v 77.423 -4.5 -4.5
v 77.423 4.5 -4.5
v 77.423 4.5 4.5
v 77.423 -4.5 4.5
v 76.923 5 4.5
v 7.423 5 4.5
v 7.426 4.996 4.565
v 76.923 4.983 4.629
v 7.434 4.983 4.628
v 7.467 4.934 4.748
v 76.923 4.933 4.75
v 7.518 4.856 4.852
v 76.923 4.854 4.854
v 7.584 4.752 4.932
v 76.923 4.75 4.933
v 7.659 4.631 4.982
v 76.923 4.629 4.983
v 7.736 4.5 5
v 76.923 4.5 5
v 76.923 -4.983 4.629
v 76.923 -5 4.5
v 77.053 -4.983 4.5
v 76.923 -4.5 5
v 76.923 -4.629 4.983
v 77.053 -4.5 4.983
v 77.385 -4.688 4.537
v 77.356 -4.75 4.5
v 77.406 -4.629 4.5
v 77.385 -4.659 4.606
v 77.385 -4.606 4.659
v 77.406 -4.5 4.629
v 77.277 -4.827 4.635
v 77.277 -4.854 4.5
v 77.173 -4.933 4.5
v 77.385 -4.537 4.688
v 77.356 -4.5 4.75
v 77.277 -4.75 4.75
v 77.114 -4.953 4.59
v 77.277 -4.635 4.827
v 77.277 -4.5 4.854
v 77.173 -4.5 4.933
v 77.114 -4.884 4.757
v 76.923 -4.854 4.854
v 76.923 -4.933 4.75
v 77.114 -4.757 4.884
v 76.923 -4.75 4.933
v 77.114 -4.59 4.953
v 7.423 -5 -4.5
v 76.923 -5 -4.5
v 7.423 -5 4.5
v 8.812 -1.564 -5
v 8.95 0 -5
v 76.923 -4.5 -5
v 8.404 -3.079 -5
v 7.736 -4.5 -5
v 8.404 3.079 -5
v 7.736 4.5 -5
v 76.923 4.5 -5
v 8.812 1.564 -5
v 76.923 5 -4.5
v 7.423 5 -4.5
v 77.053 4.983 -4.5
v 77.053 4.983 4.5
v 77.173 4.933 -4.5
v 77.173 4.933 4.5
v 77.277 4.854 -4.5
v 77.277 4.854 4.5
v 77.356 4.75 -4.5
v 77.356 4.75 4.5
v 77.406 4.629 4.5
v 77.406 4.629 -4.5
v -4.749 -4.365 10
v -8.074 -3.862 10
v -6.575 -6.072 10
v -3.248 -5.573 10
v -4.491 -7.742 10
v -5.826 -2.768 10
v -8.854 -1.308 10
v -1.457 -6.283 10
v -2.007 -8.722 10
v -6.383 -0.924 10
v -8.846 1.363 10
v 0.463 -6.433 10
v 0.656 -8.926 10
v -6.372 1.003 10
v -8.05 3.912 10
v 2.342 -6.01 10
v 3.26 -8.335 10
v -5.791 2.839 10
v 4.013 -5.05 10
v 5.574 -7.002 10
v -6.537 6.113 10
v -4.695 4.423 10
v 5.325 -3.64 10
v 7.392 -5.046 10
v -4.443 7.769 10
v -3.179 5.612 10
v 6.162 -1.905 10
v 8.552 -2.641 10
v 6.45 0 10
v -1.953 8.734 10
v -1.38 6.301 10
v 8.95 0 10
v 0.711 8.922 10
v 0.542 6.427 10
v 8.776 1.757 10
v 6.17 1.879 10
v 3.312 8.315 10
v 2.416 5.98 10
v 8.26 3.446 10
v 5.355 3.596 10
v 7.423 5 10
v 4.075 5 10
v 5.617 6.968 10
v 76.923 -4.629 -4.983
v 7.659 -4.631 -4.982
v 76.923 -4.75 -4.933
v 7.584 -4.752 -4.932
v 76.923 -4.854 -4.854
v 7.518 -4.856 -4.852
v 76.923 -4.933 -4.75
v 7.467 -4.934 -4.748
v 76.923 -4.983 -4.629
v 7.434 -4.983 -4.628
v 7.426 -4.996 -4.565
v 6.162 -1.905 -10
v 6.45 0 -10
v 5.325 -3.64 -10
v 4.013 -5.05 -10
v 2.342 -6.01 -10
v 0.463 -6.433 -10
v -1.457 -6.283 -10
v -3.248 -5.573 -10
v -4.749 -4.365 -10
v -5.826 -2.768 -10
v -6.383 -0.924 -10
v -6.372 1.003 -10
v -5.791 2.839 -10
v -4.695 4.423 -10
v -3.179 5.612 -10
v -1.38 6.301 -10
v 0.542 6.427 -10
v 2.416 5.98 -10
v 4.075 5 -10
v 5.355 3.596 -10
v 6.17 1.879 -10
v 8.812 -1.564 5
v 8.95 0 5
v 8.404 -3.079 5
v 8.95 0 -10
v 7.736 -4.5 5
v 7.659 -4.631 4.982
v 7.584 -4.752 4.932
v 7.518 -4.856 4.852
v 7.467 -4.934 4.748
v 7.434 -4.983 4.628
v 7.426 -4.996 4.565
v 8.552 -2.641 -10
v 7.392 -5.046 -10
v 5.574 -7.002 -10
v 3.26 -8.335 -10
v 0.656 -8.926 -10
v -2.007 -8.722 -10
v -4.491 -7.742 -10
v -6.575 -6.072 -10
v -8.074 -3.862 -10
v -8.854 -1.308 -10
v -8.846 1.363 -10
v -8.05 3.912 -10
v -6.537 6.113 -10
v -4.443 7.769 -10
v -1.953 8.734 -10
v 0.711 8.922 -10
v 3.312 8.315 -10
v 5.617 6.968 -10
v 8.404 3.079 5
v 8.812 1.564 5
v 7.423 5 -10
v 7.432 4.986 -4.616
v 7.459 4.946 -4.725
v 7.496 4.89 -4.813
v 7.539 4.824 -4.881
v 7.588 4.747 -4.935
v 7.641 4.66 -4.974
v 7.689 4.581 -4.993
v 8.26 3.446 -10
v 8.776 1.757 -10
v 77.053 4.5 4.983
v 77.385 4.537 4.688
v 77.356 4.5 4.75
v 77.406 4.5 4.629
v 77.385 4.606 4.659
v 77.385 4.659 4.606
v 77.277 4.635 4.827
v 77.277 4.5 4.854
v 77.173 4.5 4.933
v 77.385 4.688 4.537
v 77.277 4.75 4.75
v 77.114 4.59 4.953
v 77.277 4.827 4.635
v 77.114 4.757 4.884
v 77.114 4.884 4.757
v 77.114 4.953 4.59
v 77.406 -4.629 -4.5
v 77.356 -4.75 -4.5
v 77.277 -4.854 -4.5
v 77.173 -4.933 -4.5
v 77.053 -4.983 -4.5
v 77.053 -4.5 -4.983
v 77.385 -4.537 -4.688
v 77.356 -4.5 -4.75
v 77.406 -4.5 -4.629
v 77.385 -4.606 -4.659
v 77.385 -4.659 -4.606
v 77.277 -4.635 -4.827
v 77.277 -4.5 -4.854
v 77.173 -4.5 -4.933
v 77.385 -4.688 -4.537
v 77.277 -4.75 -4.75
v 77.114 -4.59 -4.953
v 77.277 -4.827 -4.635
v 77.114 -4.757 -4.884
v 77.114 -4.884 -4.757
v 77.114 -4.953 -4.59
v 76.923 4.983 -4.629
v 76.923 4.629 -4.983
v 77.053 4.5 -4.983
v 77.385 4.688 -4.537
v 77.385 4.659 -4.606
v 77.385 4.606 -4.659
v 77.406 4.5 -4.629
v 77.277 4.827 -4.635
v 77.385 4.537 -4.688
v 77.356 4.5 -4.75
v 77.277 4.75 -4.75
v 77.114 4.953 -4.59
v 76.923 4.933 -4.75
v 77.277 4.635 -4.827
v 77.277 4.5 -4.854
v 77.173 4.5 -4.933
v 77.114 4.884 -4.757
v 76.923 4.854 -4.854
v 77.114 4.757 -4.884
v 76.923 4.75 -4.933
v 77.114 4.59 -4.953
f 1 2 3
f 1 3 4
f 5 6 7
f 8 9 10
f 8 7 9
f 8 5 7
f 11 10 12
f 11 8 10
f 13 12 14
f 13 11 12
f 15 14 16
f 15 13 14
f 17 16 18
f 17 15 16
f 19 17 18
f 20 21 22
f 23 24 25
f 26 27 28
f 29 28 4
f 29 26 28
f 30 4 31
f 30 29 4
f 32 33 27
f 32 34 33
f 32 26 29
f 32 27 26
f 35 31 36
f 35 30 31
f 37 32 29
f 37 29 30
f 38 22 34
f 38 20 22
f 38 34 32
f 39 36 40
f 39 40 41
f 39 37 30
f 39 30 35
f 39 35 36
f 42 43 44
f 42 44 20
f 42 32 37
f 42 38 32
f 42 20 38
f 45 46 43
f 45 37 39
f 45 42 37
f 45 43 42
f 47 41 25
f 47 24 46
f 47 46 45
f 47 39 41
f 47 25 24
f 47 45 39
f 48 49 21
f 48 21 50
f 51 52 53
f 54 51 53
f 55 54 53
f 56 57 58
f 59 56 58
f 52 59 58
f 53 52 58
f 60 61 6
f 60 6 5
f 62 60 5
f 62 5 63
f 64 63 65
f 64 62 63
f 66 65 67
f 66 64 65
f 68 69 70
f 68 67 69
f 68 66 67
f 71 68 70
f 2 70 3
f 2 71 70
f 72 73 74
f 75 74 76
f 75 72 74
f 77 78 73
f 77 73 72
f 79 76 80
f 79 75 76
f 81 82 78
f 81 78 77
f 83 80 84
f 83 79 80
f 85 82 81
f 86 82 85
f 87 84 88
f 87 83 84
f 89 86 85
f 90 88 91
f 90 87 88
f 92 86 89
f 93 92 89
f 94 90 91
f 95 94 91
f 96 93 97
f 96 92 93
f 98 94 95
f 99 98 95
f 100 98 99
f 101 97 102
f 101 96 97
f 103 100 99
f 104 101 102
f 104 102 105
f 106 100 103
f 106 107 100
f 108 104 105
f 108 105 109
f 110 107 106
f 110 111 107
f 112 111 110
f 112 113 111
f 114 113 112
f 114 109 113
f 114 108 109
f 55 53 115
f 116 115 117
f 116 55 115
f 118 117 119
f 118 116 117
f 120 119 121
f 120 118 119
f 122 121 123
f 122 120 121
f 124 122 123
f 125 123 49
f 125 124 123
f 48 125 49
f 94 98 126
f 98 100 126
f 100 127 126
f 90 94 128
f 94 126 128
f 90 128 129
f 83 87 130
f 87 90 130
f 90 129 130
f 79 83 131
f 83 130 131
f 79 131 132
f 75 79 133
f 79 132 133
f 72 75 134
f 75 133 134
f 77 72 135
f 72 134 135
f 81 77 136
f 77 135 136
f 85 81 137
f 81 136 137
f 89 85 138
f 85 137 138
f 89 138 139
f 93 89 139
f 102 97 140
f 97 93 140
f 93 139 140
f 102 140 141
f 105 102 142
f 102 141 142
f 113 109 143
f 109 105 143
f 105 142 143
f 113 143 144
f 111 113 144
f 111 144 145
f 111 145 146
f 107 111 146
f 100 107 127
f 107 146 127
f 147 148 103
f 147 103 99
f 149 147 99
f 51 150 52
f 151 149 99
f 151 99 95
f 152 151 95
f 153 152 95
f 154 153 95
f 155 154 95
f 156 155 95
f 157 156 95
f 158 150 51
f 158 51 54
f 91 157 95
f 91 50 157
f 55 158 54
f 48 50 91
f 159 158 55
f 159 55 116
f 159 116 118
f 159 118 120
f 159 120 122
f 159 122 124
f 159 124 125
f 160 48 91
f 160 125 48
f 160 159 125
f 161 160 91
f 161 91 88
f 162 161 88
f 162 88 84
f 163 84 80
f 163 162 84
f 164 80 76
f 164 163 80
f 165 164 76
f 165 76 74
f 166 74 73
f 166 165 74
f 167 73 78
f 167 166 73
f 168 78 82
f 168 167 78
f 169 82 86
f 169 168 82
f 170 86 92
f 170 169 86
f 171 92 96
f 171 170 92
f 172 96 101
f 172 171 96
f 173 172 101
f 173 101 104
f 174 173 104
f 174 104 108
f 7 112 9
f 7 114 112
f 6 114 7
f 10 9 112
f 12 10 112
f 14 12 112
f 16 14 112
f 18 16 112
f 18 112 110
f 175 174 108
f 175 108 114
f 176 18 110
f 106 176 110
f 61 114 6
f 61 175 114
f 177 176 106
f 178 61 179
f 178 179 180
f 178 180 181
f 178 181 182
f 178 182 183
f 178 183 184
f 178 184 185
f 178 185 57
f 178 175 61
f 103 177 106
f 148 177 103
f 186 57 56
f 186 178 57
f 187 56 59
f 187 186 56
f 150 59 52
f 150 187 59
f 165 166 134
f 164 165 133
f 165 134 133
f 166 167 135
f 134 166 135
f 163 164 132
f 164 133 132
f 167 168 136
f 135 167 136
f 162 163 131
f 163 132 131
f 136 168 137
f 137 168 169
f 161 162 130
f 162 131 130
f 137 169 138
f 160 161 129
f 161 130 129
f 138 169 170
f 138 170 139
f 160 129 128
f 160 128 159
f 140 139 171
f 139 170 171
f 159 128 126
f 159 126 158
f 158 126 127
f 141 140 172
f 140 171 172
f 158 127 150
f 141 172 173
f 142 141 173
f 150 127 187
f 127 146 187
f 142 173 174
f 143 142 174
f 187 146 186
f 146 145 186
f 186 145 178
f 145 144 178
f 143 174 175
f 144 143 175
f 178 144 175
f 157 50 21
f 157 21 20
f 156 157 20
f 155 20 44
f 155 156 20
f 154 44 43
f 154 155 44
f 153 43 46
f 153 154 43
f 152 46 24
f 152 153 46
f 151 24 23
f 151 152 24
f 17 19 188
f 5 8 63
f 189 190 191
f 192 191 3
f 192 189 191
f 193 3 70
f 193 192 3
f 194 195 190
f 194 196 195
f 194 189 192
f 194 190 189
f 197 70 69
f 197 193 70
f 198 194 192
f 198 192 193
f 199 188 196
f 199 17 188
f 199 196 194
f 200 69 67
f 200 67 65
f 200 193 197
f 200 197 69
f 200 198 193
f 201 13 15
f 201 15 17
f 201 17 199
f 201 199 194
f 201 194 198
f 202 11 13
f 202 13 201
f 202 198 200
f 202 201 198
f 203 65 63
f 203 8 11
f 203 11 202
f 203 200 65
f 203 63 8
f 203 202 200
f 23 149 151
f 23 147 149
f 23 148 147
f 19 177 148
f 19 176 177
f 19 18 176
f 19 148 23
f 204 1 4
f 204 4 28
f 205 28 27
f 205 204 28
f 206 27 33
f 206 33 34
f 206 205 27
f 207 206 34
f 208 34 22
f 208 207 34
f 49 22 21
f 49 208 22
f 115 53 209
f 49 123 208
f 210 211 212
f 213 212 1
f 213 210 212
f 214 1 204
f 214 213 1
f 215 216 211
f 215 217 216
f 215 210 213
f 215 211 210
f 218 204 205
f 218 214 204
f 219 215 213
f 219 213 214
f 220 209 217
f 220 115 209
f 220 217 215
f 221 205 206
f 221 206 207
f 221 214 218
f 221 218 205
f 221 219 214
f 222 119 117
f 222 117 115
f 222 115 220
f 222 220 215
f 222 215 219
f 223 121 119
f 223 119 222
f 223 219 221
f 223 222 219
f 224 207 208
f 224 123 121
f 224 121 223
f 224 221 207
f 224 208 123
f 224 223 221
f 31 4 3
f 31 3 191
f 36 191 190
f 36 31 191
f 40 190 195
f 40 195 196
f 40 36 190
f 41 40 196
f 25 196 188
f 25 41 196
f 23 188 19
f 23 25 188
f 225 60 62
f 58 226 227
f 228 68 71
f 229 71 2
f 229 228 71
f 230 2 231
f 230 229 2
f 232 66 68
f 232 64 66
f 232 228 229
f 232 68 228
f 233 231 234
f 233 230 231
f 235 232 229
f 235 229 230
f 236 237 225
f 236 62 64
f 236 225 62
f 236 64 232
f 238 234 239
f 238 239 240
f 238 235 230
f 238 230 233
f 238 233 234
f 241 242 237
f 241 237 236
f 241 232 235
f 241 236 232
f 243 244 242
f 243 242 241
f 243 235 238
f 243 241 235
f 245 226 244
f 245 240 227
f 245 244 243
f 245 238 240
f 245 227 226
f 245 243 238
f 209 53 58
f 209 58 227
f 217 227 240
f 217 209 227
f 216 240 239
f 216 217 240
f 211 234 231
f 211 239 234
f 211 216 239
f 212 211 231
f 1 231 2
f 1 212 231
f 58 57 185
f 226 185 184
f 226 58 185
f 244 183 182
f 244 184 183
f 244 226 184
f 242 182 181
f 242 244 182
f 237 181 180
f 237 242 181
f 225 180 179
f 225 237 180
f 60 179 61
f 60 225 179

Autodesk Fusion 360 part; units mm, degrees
sketch "Sketch1" plane through (0, 0, 0) normal (0, 0, 1) x (1, 0, 0)
  circle A0 centre (0, 0) radius 6.45
  circle A1 centre (0, 0) radius 6.35
  circle A2 centre (0, 0) radius 8.95
  line L0 (0, 0) -> (0, 5)
  line L1 (0, 5) -> (7.4231, 5)
  line L2 (7.4231, 5) -> (77.4231, 5)
  line L3 (77.4231, 5) -> (77.4231, -5)
  line L4 (77.4231, -5) -> (7.4231, -5)
  line L5 (7.4231, -5) -> (7.4231, 5)
  dimension "d1" = 12.9
  dimension "d2" = 12.7
  dimension "d3" = 17.9
  dimension "d4" = 5
  dimension "d5" = 70
  dimension "d6" = 10
extrude "Extrude2" add sketch "Sketch1" along normal blind 10 and the other way blind 10 contours A2 L5 | A2 L5
extrude "Extrude3" add sketch "Sketch1" along normal blind 5 and the other way blind 5 contours A2 L2 L3 L4
fillet "Fillet1" radius 0.5 4 edges at (42.4231, -5, 5) (42.4231, -5, -5) (42.4231, 5, -5) (42.4231, 5, 5) 1 faces at (77.4231, 1.6667, -1.6667)
